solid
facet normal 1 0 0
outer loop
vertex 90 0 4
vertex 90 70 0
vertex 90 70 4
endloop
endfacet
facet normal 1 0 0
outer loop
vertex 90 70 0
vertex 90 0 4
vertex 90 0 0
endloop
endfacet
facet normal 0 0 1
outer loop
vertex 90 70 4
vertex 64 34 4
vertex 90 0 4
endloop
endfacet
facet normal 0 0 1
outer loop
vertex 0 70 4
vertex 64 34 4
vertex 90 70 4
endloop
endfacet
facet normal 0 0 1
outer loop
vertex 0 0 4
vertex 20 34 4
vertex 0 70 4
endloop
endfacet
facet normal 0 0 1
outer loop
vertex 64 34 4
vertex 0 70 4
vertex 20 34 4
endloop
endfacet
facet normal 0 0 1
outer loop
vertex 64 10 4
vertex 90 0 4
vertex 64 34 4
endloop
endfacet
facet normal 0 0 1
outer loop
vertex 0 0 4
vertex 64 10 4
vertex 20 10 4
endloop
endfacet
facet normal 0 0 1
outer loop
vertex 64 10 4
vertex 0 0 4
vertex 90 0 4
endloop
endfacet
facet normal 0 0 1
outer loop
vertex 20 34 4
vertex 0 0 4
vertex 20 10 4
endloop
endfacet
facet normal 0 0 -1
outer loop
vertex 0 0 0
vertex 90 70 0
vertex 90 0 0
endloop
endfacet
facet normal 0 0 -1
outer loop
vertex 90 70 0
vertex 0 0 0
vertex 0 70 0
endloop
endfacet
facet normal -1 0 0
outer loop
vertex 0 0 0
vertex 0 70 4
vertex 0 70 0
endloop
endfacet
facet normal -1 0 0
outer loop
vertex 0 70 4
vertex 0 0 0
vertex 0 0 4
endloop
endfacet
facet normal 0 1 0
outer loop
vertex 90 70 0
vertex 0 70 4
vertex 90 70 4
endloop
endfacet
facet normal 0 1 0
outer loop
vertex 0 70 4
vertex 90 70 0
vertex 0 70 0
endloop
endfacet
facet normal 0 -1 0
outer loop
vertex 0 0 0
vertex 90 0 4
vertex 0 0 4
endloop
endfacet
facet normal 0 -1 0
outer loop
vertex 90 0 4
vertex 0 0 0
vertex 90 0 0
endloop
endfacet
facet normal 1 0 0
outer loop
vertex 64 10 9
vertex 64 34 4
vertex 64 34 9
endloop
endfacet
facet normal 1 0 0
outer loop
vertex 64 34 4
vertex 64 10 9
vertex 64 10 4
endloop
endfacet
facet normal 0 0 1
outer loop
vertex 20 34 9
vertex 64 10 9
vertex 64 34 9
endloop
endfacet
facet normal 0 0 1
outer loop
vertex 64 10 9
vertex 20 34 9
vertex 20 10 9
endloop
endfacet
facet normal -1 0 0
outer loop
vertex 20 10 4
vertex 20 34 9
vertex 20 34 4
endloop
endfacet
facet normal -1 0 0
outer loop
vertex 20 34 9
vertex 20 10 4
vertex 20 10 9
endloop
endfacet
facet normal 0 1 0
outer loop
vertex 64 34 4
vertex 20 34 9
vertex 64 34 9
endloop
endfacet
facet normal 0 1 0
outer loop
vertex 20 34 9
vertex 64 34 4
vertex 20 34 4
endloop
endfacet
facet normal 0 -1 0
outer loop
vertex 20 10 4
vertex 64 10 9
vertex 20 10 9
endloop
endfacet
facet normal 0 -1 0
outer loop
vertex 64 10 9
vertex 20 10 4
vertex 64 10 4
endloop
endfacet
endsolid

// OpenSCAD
color([.03,.32,.16])cube([90,70,4]);color([.08,.08,.08])translate([20,10,4])cube([44,24,5]);
